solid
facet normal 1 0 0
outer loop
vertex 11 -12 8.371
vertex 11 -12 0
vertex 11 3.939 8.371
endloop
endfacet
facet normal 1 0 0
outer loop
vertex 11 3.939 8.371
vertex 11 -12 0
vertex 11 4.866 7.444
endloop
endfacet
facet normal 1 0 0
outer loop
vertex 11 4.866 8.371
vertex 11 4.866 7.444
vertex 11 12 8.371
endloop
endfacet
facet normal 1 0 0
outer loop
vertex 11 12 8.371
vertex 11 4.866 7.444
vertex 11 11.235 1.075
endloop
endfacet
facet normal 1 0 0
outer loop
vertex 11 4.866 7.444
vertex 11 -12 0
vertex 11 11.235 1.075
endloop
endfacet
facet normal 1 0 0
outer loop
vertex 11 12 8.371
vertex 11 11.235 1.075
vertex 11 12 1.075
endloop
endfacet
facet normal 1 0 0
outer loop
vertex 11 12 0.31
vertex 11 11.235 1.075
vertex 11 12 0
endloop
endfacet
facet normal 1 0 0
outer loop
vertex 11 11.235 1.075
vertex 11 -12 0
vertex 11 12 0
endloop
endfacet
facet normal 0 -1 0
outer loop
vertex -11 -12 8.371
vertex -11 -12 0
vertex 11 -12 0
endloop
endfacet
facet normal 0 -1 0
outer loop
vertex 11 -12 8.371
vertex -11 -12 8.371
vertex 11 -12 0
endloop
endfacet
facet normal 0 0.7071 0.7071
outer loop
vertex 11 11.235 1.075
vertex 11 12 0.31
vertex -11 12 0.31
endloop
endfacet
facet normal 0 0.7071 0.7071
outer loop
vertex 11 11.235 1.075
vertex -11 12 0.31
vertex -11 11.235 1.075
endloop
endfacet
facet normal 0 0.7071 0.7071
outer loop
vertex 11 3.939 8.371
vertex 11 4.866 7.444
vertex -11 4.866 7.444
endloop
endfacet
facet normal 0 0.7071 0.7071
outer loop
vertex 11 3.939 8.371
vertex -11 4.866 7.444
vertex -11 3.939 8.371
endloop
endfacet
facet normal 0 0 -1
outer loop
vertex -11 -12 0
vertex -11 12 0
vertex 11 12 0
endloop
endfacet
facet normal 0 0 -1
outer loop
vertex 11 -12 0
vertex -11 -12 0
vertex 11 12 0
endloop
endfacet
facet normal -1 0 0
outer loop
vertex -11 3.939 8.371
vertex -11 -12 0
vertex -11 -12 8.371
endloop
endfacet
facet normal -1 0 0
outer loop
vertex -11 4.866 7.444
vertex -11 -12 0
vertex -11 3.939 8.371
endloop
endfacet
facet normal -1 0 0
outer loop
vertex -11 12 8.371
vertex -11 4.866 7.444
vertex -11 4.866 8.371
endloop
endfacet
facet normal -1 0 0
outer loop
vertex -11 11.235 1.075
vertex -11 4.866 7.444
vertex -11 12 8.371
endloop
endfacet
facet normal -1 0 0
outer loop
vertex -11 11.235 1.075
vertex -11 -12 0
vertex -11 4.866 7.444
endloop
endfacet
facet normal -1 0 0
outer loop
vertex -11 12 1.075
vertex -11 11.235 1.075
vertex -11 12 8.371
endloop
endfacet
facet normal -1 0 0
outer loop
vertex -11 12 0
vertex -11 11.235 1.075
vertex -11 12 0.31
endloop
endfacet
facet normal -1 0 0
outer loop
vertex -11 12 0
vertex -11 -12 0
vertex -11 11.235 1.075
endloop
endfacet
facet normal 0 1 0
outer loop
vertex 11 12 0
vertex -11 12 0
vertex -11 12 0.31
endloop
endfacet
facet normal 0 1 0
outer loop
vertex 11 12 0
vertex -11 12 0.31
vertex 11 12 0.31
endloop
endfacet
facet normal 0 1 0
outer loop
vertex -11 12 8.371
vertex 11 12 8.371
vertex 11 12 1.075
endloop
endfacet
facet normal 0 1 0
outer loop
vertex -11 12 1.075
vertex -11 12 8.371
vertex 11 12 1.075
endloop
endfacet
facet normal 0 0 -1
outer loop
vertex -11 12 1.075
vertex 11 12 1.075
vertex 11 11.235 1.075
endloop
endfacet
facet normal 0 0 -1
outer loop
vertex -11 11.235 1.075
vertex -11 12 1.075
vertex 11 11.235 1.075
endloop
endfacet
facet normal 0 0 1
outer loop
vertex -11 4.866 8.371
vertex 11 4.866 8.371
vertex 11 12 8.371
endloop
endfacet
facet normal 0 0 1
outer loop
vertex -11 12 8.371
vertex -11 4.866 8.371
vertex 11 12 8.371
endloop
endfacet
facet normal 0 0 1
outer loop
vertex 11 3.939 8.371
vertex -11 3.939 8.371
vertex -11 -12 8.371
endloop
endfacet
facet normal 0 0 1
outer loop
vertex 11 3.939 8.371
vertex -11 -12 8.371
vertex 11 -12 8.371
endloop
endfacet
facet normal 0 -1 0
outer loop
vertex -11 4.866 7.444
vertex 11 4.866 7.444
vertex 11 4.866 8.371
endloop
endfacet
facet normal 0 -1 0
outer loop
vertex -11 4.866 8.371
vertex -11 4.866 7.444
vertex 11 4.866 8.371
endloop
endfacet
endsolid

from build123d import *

# Parameters (mm, degrees)
SKETCH1_W               = 22
SKETCH1_H               = 24
BOSS_EXTRUDE1_DEPTH     = 8.371
CUT_EXTRUDE2_DEPTH      = 1
CUT_EXTRUDE2_DEPTH_BACK = 23
BOSS_EXTRUDE3_DEPTH     = 22


with BuildPart() as part:
    # Sketch1 → Boss-Extrude1 (new body)
    with BuildSketch(Plane.XY):
        Rectangle(SKETCH1_W, SKETCH1_H)
    extrude(amount=BOSS_EXTRUDE1_DEPTH)

    # Sketch5 → Cut-Extrude2 (cut, two sides)
    with BuildSketch(Plane(origin=(11, 0, 0), x_dir=(0, 0, -1), z_dir=(1, 0, 0))) as cut_extrude2_sk:
        Polygon((42.565554112, 54.875536807), (-0.309982694, 12), (-8.371, 3.938982694), (-51.246536807, -38.936554112), (-136.99761042, 46.814519501), (-43.185519501, 140.62661042), align=None)
    extrude(amount=CUT_EXTRUDE2_DEPTH, mode=Mode.SUBTRACT)
    extrude(cut_extrude2_sk.sketch, amount=-CUT_EXTRUDE2_DEPTH_BACK, mode=Mode.SUBTRACT)

    # Sketch6 → Boss-Extrude3 (add, through all)
    with BuildSketch(Plane(origin=(11, 0, 0), x_dir=(0, 0, -1), z_dir=(1, 0, 0))):
        Polygon((-8.371, 12), (-1.075372561, 12), (-1.075372561, 11.234610134), (-7.444138152, 4.865844542), (-8.371, 4.865844542), align=None)
    extrude(amount=-BOSS_EXTRUDE3_DEPTH)


solid = part.part
